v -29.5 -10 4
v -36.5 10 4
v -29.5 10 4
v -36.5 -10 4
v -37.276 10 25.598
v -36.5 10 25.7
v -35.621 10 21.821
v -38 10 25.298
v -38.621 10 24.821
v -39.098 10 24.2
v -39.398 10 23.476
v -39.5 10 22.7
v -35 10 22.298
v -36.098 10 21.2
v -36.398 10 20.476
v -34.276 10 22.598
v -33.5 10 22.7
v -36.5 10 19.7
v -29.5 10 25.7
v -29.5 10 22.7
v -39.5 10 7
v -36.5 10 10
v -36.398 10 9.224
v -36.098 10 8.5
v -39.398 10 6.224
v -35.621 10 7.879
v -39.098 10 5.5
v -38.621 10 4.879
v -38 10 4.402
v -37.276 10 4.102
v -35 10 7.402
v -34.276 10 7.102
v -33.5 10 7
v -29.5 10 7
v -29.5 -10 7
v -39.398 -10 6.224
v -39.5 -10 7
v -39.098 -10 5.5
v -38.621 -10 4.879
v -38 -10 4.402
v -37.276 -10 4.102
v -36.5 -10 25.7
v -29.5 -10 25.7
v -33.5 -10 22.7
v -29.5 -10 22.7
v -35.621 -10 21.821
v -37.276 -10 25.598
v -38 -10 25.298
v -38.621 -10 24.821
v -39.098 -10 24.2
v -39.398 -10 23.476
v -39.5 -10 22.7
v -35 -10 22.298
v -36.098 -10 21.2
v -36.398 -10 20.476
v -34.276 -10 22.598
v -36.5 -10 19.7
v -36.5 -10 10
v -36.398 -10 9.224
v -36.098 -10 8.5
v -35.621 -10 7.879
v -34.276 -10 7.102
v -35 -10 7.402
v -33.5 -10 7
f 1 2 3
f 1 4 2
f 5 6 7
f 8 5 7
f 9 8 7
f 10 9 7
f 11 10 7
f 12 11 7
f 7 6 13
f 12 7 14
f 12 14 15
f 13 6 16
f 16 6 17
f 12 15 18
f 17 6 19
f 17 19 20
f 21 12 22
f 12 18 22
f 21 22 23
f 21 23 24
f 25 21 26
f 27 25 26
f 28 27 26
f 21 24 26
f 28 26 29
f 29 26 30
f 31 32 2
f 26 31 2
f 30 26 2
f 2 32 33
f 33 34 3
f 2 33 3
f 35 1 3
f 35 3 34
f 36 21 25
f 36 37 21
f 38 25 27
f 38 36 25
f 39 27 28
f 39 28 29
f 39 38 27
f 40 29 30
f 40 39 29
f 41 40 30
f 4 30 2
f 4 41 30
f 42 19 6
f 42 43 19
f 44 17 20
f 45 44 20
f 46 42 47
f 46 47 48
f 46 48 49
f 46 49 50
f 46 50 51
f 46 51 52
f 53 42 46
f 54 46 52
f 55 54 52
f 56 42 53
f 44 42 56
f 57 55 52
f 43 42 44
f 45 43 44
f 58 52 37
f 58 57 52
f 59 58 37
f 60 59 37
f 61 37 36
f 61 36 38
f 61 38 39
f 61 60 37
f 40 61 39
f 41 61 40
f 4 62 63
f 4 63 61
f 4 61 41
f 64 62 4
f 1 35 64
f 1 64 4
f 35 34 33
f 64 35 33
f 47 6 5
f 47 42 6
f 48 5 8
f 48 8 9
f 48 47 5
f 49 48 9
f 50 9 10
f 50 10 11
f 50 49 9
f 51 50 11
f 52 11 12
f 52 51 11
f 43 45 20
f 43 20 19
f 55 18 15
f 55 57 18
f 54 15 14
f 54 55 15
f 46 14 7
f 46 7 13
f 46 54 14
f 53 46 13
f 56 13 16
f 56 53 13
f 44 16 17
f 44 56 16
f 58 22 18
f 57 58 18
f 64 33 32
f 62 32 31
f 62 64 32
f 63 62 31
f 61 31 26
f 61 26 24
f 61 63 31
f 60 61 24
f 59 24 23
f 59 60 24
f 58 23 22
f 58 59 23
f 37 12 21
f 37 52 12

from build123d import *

# Parameters (mm, degrees)
FILLET_R    = 3
FILLET001_R = 3
FILLET002_R = 3
FILLET003_R = 3


with BuildPart() as part:
    # Sweep: sweep along a path in Sketch005
    with BuildLine(Plane.XY) as sweep_path:
        Line((-30, 10), (-30, -10))
    # Sketch004 → Sweep (sweep)
    with BuildSketch(Plane.XZ):
        Polygon((-29.5, 25.7), (-39.5, 25.7), (-39.5, 4), (-29.5, 4), (-29.5, 7), (-36.5, 7), (-36.5, 22.7), (-29.5, 22.7), align=None)
    sweep(path=sweep_path.line)

    # Fillet
    fillet_edges = [part.edges().sort_by_distance(p)[0] for p in [
        (-39.5, 0, 25.7),
    ]]
    fillet(fillet_edges, radius=FILLET_R)

    # Fillet001
    fillet001_edges = [part.edges().sort_by_distance(p)[0] for p in [
        (-39.5, 0, 4),
    ]]
    fillet(fillet001_edges, radius=FILLET001_R)

    # Fillet002
    fillet002_edges = [part.edges().sort_by_distance(p)[0] for p in [
        (-36.5, 0, 7),
    ]]
    fillet(fillet002_edges, radius=FILLET002_R)

    # Fillet003
    fillet003_edges = [part.edges().sort_by_distance(p)[0] for p in [
        (-36.5, 0, 22.7),
    ]]
    fillet(fillet003_edges, radius=FILLET003_R)


solid = part.part
